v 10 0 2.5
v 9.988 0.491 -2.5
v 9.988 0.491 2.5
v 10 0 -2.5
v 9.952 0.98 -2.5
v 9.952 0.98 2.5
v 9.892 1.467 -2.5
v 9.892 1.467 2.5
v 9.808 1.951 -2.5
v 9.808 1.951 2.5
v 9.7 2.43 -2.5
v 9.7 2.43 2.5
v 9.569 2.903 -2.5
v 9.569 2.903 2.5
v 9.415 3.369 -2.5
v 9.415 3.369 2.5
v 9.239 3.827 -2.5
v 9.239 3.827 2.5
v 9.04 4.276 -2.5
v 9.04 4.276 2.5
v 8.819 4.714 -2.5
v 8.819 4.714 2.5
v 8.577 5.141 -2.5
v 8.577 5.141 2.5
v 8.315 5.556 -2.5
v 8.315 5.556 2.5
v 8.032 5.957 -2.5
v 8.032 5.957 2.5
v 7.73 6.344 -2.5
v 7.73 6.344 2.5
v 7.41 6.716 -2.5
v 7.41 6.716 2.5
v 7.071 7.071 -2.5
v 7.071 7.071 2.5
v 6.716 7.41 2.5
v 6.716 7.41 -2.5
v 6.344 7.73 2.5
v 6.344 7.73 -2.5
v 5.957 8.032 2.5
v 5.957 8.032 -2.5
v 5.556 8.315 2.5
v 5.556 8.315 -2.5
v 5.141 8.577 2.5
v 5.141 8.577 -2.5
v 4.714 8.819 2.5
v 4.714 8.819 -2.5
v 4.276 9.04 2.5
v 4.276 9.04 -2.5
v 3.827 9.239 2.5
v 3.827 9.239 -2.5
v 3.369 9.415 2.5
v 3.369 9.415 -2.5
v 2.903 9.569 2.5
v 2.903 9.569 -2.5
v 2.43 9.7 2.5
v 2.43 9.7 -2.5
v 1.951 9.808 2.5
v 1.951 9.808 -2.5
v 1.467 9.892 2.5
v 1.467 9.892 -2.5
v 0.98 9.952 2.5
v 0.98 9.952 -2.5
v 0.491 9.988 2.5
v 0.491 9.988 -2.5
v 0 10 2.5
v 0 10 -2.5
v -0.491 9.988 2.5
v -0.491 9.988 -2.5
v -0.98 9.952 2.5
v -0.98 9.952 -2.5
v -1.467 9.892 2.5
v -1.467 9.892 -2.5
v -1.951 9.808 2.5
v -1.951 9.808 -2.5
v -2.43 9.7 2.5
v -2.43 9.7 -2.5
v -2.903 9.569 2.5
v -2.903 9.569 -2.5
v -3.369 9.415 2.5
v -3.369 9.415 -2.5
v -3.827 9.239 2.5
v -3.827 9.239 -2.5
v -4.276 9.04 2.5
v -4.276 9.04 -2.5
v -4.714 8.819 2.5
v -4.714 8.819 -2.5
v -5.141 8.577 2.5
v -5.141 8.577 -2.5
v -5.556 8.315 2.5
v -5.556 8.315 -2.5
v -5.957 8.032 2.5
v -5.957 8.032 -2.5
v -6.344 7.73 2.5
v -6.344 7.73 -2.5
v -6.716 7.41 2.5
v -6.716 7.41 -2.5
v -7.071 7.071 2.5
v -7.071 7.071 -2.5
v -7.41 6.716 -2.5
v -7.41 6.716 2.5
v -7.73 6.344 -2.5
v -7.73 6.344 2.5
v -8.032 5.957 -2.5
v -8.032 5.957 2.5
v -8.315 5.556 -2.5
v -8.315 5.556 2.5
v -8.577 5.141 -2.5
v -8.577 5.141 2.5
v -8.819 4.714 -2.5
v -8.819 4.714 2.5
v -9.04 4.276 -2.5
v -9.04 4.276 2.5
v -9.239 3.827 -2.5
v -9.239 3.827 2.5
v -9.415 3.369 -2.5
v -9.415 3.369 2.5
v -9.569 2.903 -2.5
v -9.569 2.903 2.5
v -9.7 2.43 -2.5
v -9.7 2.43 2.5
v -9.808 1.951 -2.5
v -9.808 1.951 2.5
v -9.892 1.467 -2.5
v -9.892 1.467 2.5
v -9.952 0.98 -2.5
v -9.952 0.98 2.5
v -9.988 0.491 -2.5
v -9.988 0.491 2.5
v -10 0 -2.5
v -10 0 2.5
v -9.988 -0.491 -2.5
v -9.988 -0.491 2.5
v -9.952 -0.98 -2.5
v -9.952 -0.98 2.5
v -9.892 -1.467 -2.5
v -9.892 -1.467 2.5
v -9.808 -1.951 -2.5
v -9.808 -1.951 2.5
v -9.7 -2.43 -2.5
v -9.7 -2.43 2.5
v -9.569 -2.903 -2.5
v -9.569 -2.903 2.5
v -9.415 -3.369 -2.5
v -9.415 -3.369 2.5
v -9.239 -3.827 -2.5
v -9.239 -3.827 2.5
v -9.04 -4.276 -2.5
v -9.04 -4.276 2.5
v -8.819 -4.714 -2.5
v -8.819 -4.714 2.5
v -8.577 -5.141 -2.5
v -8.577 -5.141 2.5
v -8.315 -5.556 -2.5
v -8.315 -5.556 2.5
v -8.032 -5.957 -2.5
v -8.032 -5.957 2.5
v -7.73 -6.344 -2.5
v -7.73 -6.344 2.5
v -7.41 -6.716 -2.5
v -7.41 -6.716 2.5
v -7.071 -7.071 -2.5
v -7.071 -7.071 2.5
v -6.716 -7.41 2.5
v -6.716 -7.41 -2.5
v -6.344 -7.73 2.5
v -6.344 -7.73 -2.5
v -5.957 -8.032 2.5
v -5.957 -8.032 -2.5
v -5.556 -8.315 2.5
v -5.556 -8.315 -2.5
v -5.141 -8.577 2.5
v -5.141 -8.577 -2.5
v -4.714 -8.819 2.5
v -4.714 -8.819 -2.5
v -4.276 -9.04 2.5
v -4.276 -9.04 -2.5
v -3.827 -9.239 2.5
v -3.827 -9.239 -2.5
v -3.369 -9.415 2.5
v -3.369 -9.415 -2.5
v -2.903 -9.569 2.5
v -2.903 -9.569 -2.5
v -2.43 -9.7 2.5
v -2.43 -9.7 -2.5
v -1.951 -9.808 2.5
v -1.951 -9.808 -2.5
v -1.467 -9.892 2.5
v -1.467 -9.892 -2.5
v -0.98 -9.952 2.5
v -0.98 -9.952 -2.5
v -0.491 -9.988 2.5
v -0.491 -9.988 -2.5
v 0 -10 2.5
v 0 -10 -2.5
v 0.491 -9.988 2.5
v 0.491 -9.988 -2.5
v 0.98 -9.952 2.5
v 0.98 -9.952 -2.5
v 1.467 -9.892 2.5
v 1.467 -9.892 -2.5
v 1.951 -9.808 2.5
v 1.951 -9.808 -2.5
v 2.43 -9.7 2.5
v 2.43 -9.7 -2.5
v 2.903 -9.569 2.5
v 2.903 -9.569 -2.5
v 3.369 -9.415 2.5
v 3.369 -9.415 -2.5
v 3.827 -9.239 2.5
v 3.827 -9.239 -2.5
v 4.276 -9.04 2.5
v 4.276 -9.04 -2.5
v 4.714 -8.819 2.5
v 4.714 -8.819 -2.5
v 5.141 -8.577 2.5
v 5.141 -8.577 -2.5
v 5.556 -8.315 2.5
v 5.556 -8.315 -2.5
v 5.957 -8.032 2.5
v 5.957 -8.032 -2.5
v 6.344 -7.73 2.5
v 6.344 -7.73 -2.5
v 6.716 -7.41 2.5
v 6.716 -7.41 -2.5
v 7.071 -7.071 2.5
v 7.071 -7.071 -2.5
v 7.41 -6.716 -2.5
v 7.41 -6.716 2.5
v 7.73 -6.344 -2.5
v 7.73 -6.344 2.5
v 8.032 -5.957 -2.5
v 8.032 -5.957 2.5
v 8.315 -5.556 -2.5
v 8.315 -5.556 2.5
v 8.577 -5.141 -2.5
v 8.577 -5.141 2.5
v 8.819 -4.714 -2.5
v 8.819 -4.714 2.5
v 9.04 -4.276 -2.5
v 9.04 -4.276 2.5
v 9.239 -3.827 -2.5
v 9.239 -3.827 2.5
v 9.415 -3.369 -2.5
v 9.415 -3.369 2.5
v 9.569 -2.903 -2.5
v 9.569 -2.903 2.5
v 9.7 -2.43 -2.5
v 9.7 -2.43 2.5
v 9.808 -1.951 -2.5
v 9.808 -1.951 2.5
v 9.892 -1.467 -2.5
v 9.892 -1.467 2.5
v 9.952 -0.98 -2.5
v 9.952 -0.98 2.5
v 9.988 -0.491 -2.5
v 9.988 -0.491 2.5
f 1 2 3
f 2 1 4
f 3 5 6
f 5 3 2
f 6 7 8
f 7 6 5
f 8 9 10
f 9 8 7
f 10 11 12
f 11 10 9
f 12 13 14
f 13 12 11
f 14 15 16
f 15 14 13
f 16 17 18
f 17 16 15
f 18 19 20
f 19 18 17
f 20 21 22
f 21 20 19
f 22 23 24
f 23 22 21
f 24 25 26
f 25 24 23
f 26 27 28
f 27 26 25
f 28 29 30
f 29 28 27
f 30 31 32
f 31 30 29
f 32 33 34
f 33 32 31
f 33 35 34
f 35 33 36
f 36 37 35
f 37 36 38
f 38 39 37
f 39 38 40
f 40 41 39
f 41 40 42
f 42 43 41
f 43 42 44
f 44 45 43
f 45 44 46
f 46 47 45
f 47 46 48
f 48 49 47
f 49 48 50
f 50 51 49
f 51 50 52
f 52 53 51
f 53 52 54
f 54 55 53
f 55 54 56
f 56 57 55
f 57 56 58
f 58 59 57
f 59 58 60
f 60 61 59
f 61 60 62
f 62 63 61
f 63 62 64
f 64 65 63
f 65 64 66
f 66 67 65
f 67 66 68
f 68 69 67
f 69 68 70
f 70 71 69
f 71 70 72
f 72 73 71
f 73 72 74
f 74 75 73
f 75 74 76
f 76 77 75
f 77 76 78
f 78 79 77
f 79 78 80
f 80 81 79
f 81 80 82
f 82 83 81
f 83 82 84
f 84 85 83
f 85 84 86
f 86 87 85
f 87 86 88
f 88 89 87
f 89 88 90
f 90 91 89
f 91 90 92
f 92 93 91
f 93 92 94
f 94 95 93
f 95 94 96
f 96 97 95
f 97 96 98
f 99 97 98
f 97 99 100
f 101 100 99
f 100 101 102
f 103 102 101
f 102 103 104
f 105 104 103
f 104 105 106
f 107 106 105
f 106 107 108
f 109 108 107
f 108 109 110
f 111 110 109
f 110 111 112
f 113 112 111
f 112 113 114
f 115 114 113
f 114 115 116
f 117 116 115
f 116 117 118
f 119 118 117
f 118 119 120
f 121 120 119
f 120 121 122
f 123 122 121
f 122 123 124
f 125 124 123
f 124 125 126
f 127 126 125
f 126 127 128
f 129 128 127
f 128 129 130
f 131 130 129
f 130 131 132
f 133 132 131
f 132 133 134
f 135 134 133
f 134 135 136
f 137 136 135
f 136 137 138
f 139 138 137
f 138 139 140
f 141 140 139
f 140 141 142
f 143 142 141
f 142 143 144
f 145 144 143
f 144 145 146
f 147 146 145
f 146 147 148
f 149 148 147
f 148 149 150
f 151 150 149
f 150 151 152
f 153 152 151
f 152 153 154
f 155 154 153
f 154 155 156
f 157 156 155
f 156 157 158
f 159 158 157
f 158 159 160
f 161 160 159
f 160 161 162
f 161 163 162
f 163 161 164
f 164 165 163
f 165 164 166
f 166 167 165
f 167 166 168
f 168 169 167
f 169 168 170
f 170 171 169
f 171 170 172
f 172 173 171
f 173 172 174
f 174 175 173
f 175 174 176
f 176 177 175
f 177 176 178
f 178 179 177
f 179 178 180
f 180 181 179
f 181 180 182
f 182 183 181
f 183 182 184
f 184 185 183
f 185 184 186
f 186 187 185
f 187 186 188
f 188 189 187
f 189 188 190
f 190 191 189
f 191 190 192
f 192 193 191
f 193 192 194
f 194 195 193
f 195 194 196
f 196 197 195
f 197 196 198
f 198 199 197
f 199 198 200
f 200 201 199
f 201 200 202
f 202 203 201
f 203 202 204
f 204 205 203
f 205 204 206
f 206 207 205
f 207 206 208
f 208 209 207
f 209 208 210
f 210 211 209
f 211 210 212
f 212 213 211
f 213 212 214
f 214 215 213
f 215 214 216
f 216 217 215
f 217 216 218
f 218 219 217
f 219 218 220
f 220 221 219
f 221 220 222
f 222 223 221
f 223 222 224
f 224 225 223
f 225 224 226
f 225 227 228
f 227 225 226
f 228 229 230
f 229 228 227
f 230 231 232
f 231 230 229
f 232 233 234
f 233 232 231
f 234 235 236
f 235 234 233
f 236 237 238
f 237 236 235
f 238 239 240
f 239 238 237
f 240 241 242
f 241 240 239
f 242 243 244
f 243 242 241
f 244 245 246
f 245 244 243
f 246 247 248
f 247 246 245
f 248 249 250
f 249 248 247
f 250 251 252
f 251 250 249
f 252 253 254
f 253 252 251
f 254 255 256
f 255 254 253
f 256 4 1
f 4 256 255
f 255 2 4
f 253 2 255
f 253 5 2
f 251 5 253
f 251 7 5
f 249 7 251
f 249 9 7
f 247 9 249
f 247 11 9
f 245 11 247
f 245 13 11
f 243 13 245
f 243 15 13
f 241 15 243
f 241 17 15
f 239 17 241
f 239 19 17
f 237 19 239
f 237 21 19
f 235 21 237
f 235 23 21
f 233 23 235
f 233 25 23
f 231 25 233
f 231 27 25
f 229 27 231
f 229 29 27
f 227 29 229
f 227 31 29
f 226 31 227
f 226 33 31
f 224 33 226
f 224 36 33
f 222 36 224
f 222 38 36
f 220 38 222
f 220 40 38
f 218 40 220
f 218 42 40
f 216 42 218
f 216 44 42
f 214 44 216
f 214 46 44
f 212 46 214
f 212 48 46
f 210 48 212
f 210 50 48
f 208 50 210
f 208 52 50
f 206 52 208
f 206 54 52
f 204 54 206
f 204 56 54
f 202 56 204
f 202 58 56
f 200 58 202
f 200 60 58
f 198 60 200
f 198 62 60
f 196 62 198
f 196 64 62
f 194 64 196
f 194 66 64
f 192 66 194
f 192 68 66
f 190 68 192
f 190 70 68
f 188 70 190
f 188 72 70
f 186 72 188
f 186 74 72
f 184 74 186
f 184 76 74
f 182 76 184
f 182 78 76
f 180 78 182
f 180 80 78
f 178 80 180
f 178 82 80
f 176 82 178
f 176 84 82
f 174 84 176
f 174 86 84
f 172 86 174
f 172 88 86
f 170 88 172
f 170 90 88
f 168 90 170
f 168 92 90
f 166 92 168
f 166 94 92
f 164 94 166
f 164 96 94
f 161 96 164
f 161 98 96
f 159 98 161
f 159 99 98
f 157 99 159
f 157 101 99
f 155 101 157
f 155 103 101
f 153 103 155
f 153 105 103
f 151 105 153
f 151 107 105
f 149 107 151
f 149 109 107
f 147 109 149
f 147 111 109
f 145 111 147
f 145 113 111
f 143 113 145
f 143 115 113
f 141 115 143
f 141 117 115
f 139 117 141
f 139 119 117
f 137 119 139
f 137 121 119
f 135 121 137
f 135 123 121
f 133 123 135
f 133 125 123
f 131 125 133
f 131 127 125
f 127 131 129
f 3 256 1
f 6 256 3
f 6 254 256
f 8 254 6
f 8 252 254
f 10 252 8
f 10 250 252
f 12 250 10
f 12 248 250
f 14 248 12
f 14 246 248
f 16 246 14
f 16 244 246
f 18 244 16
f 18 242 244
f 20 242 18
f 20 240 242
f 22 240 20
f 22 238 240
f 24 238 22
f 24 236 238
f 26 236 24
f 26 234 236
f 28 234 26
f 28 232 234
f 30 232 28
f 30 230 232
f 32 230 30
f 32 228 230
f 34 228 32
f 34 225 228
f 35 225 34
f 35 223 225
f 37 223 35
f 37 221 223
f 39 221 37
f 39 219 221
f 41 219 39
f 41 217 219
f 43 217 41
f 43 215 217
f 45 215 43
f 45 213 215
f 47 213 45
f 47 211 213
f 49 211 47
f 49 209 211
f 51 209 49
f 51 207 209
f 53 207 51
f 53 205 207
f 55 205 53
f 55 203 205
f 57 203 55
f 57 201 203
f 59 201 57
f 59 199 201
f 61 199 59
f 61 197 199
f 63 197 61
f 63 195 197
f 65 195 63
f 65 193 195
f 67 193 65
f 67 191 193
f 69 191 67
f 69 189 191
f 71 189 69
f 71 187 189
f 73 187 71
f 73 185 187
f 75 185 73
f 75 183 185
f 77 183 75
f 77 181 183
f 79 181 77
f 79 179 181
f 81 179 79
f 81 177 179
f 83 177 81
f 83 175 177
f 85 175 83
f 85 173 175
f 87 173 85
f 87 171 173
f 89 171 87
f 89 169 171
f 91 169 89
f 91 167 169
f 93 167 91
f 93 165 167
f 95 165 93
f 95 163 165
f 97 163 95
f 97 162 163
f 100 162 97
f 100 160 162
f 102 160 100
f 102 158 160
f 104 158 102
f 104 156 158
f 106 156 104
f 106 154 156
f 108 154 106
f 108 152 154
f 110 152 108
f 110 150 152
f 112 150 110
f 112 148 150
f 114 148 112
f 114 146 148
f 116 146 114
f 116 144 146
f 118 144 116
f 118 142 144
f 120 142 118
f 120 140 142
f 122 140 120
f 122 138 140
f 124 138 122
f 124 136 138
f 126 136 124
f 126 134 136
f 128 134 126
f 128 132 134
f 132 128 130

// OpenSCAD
$fn = 128;

magnet_d = 20;
magnet_h = 5;

cylinder(d = magnet_d, h = magnet_h, center = true);
